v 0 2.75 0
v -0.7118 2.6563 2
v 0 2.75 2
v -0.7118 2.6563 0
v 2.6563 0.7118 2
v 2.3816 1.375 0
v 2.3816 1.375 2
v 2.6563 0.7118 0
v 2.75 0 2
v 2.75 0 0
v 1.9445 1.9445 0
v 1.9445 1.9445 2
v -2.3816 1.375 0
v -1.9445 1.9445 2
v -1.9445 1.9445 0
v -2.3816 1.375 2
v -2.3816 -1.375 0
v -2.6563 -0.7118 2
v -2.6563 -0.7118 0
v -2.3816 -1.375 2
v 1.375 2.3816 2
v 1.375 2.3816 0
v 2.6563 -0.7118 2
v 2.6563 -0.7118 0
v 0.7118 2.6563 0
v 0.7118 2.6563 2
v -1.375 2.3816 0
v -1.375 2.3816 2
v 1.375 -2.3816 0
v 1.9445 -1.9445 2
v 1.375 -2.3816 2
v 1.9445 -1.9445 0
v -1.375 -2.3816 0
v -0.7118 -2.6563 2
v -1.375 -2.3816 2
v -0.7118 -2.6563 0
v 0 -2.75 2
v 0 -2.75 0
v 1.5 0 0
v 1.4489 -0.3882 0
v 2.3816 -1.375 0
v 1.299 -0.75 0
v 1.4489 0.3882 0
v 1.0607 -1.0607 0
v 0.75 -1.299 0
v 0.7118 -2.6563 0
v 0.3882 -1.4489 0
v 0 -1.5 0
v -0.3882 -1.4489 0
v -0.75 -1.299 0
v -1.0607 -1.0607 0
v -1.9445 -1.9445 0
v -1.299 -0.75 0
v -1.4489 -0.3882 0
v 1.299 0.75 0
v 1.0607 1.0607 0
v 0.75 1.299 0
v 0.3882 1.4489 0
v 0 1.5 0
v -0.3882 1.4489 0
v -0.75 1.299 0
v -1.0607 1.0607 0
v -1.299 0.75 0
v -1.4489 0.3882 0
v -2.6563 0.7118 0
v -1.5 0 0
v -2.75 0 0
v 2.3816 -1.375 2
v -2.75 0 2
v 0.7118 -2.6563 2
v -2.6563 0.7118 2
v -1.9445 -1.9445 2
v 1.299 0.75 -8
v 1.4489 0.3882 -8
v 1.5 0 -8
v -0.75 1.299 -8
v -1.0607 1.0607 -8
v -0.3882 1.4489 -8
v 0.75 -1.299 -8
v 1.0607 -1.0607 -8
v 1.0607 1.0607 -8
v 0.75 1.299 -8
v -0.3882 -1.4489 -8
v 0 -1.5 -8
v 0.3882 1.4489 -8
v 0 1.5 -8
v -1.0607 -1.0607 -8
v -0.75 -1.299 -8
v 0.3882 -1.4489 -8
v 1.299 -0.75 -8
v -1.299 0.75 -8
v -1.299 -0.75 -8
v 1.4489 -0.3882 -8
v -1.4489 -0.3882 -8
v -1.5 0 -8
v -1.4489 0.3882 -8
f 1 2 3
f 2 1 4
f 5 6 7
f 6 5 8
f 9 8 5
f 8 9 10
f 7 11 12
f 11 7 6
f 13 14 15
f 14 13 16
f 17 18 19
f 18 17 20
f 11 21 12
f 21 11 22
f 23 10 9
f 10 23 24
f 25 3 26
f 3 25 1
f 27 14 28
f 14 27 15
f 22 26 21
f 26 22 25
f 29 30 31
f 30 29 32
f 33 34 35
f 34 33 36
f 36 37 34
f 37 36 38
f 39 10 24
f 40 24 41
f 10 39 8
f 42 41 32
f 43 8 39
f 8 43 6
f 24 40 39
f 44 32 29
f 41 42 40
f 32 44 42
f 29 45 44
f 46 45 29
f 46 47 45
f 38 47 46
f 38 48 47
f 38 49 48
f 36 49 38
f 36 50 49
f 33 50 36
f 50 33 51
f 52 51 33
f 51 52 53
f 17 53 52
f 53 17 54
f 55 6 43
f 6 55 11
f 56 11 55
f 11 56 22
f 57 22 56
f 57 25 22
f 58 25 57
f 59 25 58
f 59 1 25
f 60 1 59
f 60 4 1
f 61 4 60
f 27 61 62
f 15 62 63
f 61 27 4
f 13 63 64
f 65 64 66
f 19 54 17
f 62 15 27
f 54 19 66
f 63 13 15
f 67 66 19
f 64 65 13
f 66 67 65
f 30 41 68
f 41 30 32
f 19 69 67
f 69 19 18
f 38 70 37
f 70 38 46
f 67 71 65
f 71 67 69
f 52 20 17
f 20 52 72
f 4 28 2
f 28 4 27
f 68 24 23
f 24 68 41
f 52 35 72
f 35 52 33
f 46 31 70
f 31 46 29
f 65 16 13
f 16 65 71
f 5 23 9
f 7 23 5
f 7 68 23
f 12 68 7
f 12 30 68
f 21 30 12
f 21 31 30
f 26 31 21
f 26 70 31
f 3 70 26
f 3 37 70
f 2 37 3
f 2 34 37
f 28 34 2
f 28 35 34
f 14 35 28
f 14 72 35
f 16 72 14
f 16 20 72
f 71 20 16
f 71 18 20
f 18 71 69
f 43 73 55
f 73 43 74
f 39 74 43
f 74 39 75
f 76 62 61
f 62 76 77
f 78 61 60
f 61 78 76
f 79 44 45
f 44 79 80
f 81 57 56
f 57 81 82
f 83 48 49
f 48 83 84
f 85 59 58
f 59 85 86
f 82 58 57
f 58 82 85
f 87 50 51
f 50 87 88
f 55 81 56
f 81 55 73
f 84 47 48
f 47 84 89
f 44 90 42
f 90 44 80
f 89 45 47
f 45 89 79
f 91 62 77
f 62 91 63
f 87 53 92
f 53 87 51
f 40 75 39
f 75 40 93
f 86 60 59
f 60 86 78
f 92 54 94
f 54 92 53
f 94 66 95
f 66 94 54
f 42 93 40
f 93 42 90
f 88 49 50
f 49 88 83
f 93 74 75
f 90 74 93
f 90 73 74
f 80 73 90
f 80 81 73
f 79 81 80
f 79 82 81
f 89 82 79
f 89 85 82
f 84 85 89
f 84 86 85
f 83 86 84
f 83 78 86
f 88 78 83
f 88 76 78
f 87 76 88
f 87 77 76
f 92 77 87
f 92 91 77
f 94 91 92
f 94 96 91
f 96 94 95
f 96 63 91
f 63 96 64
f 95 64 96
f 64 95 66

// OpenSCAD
// =====================================================================
// screw.scad — なべ小ねじ / ワッシャ / 平行ピン 簡易モデル (購入品)
//
// アセンブリで「ねじが実体として存在する」ことを示すためのプレースホルダ。
// 印刷対象ではない。ねじ山は表現しない (円柱)。
//
// 原点: 頭の座面中心。軸 (shank) は -Z、頭は +Z へ伸びる。
//   kind = "pan"    : なべ頭 (head_d / head_h)
//   kind = "flat"   : 皿頭 (原点 = 頭の上面中心 = 相手面。円錐頭 head_d→d を -head_h まで、以下軸)
//   kind = "washer" : 平ワッシャ / シム (内径 d、外径 head_d、厚 head_h。0..head_h)
//   kind = "rod"    : 全ねじ / 丸棒 (径 d、長さ l。原点 = 上端、-Z へ)
//   kind = "nut"    : 六角ナット (二面幅 head_d、厚 head_h、穴 d。0..head_h)
//
// placement.json での向き:
//   軸を -Y に向ける (デッキ上面から下へ締める等) → rotate([-90,0,0])
//   軸を +Y に向ける                              → rotate([ 90,0,0])
//   軸を +Z に向ける                              → rotate([180,0,0])
// =====================================================================

/* [呼び] */
kind    = "pan";  // [pan, flat, washer, rod, nut]
d       = 3;      // ねじ呼び径 (washer では内径)
l       = 8;      // 首下長 (washer では無視)
head_d  = 5.5;    // 頭Ø (washer では外径)
head_h  = 2.0;    // 頭高さ (washer では厚み)

$fn = 24;

assert(d > 0 && (kind == "rod" || head_d > d), "頭が軸より小さい");
assert(kind == "washer" || l > 0, "首下長が不正");

if (kind == "pan") {
    // 頭 (なべ: 上面をわずかに丸める代わりに単純円柱)
    cylinder(d = head_d, h = head_h);
    // 軸
    translate([0, 0, -l]) cylinder(d = d, h = l + 0.01);
} else if (kind == "flat") {
    translate([0, 0, -head_h]) cylinder(d1 = d, d2 = head_d, h = head_h);
    translate([0, 0, -l]) cylinder(d = d, h = l - head_h + 0.01);
} else if (kind == "rod") {
    translate([0, 0, -l]) cylinder(d = d, h = l);
} else if (kind == "nut") {
    difference() {
        cylinder(d = head_d / cos(30), h = head_h, $fn = 6);
        translate([0, 0, -1]) cylinder(d = d, h = head_h + 2);
    }
} else {
    difference() {
        cylinder(d = head_d, h = head_h);
        translate([0, 0, -1]) cylinder(d = d, h = head_h + 2);
    }
}

echo(str("screw ", kind, " M", d, (kind == "pan" ? str("x", l) : str(" od", head_d, " t", head_h))));
